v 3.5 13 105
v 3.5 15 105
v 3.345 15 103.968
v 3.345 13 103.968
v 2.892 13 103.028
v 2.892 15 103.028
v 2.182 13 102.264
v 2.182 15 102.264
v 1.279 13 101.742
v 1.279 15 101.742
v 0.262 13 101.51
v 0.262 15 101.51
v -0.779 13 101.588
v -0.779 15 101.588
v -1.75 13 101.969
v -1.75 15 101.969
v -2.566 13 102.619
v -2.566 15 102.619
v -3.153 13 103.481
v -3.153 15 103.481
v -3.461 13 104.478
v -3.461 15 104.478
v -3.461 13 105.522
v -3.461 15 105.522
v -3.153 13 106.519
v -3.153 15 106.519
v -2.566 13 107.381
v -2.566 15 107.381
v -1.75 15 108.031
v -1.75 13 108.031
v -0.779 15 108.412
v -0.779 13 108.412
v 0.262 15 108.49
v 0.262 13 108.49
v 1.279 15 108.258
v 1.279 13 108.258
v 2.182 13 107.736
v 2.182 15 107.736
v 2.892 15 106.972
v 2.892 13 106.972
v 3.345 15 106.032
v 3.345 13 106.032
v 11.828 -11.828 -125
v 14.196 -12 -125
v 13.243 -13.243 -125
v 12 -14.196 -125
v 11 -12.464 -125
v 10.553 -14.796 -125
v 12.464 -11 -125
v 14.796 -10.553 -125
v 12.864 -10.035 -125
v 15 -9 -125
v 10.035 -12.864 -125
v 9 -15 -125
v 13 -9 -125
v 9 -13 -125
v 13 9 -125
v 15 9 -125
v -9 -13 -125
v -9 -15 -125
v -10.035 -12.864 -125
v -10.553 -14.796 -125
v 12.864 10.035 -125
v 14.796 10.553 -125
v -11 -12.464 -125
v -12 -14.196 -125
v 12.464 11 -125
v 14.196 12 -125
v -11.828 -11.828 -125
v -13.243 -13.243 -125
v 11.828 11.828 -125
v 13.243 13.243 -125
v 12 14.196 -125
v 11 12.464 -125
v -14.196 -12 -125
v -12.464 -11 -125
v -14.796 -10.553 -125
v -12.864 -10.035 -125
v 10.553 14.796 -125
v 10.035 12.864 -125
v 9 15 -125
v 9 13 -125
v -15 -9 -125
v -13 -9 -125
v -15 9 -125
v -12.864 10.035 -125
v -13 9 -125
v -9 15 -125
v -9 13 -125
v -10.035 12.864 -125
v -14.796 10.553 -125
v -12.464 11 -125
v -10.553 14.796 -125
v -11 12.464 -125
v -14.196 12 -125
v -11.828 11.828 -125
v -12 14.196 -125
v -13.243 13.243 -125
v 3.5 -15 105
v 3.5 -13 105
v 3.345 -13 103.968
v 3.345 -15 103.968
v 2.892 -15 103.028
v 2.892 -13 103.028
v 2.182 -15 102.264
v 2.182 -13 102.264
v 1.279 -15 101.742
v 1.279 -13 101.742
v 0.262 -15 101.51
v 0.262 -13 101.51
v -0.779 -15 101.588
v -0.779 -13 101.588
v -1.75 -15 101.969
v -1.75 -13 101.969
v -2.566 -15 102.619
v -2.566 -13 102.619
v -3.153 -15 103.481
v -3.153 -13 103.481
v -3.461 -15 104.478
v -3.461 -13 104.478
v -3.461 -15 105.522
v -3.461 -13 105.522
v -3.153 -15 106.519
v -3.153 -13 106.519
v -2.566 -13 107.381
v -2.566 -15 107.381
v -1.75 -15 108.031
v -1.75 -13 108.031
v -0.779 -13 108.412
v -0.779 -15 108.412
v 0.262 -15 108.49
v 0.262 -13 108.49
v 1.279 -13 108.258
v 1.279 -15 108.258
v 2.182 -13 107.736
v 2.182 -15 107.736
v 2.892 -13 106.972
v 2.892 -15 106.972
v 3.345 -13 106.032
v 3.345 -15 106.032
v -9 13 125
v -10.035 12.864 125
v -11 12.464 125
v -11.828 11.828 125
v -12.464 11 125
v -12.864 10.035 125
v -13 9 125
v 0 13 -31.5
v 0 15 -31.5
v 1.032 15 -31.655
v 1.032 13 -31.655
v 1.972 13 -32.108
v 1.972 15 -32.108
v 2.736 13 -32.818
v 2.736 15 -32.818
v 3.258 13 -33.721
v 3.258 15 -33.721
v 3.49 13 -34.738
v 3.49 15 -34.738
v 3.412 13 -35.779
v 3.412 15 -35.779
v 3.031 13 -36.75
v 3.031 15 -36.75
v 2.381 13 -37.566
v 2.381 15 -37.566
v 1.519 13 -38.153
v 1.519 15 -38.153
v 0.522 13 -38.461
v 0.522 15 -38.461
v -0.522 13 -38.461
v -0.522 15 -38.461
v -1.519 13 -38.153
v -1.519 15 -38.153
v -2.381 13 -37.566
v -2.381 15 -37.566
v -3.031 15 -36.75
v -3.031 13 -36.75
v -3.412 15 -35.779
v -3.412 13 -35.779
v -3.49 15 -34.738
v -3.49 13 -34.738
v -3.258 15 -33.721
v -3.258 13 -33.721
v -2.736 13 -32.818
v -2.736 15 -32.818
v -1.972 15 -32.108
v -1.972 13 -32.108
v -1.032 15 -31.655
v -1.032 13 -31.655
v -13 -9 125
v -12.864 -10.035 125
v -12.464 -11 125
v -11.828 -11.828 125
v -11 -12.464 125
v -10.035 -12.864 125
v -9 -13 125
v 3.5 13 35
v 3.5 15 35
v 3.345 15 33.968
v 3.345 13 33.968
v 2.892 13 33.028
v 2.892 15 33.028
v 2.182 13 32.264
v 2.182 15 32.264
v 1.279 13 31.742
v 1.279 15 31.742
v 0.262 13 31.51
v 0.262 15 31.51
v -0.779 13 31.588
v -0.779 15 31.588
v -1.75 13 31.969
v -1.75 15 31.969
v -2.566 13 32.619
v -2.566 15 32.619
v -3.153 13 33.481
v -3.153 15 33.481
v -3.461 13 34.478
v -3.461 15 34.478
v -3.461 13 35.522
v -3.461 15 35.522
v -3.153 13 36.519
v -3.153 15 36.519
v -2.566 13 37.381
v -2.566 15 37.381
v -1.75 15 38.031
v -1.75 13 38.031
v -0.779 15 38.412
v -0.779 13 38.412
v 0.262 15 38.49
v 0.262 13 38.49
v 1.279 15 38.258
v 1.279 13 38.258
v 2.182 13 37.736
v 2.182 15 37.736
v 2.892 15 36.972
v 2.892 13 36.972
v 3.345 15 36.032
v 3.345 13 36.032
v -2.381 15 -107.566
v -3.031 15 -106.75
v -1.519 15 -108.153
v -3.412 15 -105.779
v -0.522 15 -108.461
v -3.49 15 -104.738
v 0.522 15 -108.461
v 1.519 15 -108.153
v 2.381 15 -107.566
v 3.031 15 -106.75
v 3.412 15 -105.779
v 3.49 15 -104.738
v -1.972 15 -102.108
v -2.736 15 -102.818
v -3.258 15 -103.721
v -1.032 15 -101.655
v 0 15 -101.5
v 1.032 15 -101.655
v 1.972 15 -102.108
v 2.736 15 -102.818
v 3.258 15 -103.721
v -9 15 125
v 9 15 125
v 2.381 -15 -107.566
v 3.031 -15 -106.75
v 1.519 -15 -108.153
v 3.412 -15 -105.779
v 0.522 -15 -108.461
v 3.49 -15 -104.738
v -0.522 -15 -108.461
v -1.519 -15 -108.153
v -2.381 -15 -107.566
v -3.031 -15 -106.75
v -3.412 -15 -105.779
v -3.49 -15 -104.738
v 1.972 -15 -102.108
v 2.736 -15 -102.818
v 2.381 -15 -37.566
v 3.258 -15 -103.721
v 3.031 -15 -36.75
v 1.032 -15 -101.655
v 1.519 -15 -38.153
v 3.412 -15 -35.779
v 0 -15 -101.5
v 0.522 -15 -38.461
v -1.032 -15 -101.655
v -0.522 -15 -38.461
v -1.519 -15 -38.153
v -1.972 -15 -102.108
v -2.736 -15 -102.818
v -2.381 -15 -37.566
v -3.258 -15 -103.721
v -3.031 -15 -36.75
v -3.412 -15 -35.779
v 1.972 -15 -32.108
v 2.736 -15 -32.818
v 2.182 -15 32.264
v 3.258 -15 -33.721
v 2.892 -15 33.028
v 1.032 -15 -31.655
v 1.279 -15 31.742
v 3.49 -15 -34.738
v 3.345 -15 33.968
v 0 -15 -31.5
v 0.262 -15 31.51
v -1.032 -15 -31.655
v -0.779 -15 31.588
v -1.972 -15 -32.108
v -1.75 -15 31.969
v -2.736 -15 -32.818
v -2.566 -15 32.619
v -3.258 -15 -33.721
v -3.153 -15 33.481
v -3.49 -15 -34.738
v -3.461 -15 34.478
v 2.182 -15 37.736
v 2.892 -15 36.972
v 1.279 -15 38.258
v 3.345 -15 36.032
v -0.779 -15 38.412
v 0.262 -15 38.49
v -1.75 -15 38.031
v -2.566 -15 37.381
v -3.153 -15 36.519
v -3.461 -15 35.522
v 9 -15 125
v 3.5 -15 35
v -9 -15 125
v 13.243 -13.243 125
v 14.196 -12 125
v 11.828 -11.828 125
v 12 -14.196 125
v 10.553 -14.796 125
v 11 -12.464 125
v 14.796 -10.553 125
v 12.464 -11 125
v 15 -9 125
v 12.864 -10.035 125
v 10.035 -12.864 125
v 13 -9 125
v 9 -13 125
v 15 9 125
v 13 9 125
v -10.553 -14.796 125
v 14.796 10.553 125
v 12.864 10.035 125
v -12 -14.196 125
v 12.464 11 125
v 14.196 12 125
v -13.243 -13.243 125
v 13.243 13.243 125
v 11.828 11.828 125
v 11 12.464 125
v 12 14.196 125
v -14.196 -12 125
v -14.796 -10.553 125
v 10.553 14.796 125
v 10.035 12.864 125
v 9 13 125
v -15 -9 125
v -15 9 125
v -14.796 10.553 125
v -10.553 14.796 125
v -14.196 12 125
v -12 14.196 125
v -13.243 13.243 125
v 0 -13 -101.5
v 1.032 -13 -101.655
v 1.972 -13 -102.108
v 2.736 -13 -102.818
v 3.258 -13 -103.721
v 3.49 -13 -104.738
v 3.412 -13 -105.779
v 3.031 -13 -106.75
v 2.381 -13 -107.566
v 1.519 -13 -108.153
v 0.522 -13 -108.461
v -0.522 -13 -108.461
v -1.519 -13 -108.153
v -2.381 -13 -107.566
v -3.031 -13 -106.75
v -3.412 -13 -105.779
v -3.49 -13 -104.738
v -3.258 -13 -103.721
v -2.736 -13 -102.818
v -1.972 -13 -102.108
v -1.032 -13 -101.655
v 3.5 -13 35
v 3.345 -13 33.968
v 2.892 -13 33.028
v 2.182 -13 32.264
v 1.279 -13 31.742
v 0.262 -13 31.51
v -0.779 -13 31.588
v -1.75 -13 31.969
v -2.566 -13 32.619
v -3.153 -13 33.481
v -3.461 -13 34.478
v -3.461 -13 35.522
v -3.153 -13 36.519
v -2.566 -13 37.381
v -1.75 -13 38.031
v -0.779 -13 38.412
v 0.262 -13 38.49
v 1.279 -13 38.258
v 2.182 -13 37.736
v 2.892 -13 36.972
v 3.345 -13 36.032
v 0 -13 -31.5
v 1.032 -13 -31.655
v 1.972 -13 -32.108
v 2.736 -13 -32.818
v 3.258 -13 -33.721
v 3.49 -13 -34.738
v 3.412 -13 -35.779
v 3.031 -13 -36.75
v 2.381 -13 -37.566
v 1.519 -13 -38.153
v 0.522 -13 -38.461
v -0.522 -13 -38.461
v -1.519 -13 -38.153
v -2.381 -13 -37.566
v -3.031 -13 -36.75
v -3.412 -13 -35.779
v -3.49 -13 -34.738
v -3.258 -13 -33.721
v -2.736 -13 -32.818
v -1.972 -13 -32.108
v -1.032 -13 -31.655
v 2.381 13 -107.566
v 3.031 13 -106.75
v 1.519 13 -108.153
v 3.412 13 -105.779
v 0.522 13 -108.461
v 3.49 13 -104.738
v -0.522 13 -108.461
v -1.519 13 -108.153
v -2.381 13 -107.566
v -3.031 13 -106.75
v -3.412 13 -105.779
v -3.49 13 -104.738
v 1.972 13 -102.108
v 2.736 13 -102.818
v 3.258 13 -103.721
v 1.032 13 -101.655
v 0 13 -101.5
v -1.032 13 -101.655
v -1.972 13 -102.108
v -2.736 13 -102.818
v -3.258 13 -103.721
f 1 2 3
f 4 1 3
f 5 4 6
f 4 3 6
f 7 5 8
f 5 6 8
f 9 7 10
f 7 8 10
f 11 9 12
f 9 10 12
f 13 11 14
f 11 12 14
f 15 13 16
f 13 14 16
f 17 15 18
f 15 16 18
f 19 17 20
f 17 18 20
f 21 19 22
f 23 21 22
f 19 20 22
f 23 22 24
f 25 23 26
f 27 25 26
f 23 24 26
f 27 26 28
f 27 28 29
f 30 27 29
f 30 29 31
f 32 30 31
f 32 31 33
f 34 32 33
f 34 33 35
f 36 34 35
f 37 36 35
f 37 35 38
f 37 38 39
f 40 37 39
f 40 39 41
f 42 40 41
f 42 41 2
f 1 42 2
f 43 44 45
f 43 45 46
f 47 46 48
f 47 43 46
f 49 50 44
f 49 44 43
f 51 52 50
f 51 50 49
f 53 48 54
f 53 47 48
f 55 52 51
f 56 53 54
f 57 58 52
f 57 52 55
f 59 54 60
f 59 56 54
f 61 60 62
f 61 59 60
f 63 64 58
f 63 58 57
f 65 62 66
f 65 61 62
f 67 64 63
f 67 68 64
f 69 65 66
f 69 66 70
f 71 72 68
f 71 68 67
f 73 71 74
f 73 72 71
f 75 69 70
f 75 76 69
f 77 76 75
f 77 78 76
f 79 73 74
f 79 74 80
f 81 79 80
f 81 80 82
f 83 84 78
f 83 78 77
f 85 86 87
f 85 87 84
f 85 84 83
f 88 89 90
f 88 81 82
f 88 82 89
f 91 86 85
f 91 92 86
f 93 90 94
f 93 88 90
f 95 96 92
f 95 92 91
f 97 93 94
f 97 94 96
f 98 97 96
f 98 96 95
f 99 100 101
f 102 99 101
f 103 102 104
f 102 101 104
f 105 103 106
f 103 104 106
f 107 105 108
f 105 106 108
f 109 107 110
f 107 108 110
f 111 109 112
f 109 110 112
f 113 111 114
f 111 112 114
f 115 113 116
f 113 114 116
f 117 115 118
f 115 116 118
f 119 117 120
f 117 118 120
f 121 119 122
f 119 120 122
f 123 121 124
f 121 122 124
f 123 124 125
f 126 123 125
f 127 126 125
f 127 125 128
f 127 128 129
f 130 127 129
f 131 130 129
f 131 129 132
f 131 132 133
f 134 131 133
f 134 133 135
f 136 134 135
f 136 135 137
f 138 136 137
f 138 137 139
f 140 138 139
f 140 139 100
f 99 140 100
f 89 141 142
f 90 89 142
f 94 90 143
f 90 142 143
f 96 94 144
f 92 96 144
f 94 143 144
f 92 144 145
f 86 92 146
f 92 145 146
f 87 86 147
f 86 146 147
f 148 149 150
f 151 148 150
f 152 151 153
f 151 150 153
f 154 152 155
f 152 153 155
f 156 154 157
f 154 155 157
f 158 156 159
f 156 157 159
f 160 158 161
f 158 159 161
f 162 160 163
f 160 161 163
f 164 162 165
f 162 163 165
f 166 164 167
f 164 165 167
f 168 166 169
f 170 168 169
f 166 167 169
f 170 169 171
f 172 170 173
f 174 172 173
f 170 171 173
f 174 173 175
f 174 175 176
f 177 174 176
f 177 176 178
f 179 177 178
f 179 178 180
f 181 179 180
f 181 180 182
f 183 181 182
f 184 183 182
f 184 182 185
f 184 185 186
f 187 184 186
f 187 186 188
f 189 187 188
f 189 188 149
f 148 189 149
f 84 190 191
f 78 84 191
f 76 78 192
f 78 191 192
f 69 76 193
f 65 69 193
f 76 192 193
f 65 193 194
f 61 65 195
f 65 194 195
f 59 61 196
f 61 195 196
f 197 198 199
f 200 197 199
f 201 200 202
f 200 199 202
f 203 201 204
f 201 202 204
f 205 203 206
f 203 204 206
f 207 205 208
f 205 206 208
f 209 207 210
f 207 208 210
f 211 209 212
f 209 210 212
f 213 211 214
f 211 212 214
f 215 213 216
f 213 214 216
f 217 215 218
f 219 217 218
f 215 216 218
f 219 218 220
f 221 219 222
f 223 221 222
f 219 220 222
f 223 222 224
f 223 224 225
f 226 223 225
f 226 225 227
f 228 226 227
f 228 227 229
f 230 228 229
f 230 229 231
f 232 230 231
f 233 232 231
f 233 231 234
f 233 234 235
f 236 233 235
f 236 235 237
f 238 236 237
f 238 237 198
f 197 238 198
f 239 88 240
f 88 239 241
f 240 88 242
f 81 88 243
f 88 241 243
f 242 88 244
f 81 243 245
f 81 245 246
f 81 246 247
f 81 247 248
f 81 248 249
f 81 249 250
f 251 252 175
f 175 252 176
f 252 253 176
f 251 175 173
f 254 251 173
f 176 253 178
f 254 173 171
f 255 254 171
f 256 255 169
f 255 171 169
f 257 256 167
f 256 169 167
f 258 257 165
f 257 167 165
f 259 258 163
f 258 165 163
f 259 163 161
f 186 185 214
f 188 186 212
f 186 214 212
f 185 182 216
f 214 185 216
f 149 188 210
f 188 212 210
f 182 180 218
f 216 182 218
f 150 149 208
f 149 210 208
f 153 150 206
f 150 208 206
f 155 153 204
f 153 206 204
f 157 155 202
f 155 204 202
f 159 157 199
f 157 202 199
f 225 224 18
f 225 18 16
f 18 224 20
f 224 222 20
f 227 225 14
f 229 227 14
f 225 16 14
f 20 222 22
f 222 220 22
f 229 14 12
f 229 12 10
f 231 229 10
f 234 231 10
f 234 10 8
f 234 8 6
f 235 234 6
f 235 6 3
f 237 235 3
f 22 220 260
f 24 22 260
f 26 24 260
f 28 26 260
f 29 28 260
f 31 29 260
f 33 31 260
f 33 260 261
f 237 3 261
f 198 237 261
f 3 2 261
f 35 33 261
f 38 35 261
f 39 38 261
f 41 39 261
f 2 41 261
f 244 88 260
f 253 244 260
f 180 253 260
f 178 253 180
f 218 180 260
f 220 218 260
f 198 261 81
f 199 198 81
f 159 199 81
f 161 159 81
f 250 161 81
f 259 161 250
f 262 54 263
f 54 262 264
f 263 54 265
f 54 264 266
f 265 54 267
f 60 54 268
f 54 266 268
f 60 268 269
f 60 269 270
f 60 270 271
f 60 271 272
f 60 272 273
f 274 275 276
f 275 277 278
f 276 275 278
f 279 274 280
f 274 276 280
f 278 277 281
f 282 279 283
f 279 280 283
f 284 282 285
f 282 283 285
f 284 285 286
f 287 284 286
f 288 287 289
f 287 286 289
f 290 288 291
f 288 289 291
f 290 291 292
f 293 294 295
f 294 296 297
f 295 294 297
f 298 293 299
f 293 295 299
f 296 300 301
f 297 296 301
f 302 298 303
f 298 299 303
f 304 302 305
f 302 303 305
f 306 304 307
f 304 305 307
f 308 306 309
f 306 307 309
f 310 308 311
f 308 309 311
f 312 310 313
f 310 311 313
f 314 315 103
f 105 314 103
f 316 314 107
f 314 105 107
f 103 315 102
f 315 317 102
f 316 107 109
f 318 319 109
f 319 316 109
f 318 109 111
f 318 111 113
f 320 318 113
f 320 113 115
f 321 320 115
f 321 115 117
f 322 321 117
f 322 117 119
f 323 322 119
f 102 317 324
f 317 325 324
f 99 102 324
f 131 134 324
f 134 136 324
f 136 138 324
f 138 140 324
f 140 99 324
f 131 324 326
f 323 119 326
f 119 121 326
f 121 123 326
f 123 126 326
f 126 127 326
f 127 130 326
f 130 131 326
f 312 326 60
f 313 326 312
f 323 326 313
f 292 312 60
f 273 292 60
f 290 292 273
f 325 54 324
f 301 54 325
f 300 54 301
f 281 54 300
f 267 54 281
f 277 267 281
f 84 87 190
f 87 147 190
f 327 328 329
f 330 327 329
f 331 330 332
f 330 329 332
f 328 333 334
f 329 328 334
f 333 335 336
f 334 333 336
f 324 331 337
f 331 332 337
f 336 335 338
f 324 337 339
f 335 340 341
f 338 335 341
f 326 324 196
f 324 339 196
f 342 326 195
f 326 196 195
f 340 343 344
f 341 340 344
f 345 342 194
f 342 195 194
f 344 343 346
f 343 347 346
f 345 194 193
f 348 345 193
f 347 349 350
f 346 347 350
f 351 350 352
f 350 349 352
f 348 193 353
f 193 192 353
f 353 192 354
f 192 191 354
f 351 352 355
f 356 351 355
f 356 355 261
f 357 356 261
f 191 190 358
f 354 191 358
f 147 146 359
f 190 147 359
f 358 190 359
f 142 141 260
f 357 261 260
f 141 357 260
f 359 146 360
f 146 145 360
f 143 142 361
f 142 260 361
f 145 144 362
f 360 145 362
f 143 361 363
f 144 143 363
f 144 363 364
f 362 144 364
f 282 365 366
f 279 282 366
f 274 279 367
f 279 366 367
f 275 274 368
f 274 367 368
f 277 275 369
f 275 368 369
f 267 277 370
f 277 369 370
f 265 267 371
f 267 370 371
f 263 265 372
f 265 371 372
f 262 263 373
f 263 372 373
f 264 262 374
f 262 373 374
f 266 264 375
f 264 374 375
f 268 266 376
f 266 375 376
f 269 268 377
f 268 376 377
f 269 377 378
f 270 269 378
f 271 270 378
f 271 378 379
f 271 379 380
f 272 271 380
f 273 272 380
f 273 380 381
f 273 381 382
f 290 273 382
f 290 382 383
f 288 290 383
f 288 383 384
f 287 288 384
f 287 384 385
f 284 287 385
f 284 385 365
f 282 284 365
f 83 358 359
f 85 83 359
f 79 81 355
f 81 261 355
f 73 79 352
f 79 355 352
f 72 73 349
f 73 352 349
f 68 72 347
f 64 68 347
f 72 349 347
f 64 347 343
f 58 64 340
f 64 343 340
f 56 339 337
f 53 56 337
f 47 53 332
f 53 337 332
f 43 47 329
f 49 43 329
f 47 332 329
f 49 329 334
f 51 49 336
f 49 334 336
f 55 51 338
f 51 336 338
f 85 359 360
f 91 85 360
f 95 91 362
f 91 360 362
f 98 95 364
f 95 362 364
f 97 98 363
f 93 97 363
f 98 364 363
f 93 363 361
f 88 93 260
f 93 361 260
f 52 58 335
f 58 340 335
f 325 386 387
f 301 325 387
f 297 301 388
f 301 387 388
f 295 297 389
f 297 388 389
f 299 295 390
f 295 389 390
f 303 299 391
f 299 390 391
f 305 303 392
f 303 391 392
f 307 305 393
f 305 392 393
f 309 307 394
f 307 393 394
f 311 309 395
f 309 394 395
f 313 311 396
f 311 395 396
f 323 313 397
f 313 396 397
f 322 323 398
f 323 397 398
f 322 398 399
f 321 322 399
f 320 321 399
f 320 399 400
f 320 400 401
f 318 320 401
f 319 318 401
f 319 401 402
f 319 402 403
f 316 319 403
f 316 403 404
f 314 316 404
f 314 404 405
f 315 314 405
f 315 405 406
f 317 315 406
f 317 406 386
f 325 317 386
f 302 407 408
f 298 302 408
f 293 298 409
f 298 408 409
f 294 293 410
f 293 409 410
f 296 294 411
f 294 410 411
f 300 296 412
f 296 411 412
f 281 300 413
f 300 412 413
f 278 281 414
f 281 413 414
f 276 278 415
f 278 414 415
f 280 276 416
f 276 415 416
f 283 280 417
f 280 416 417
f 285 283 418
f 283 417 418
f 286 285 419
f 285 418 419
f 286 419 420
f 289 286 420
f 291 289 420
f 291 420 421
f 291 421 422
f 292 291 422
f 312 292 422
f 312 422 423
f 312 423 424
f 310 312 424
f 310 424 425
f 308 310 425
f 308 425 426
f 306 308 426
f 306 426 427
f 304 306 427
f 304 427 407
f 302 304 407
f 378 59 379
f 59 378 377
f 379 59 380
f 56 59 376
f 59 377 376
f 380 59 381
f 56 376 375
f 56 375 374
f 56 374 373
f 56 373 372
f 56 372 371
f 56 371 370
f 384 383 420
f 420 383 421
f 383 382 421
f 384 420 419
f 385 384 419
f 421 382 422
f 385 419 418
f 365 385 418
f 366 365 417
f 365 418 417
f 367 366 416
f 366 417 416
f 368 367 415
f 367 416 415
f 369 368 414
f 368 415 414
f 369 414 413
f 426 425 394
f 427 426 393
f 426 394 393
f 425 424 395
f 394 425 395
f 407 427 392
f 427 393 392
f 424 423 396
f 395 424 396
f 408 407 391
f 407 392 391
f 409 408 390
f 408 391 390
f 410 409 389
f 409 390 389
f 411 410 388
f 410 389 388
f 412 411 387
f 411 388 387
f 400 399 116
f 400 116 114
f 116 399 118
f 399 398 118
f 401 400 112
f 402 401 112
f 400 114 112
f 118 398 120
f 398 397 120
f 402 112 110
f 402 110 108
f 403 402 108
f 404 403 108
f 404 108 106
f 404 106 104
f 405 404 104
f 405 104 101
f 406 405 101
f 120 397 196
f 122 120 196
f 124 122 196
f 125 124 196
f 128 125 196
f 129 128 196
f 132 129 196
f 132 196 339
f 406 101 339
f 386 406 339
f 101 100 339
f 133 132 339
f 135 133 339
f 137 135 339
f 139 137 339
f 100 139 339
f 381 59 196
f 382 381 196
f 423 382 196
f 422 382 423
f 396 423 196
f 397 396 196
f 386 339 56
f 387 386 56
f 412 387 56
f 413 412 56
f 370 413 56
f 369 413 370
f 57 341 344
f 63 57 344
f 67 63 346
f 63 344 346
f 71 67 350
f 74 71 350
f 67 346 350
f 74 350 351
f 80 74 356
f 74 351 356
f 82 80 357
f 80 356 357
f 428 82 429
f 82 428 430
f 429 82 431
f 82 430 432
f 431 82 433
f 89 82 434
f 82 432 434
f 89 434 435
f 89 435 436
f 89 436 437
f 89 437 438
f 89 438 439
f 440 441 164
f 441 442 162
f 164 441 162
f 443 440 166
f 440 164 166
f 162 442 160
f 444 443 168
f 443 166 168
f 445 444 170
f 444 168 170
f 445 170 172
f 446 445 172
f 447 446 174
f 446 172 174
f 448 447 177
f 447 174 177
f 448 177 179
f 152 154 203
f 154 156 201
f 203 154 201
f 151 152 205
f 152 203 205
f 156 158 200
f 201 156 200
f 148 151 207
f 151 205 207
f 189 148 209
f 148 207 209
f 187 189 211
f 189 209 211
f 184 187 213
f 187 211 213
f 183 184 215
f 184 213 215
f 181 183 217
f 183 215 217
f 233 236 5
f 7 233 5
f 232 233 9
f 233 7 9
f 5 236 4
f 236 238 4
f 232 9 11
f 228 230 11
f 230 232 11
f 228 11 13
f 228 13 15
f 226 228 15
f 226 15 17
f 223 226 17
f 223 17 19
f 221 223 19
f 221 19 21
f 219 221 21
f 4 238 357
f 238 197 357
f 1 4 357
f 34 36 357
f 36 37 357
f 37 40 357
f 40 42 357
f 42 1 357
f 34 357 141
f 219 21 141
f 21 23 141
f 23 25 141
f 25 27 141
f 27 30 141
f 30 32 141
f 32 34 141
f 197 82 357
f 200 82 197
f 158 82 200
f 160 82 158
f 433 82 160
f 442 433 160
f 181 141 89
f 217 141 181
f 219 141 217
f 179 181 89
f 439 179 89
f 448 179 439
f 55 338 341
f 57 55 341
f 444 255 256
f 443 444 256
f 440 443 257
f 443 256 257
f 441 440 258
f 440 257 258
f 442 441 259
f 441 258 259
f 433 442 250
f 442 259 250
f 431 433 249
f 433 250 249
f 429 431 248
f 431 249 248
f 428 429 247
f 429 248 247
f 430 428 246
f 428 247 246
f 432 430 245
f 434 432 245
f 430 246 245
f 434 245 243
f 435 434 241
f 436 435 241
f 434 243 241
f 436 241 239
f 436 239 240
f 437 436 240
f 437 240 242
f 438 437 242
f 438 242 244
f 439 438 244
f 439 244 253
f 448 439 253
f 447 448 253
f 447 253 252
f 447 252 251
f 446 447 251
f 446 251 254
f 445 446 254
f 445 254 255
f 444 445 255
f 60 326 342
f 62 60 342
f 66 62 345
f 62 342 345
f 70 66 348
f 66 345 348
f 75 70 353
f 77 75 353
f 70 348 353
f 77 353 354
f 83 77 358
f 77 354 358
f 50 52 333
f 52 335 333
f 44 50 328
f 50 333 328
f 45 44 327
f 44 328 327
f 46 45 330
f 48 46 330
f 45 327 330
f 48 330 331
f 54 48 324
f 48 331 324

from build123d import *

# Parameters (mm, degrees)
AUFSATZ_LINEAR_AUSTRAGEN1_DEPTH = 125
SKIZZE2_R                       = 3.5
SCHNITT_LINEAR_AUSTRAGEN1_DEPTH = 60


with BuildPart() as part:
    # Skizze1 → Aufsatz-Linear austragen1 (new, symmetric)
    with BuildSketch(Plane.XY):
        with BuildLine():
            Line((-9, 15), (9, 15))
            ThreePointArc((9, 15), (13.242640687, 13.242640687), (15, 9))
            Line((15, 9), (15, -9))
            ThreePointArc((15, -9), (13.242640687, -13.242640687), (9, -15))
            Line((9, -15), (-9, -15))
            ThreePointArc((-9, -15), (-13.242640687, -13.242640687), (-15, -9))
            Line((-15, -9), (-15, 9))
            ThreePointArc((-15, 9), (-13.242640687, 13.242640687), (-9, 15))
        make_face()
        with BuildLine():
            Line((-13, 9), (-13, -9))
            ThreePointArc((-13, -9), (-11.828427125, -11.828427125), (-9, -13))
            Line((-9, -13), (9, -13))
            ThreePointArc((9, -13), (11.828427125, -11.828427125), (13, -9))
            Line((13, -9), (13, 9))
            ThreePointArc((13, 9), (11.828427125, 11.828427125), (9, 13))
            Line((9, 13), (-9, 13))
            ThreePointArc((-9, 13), (-11.828427125, 11.828427125), (-13, 9))
        make_face(mode=Mode.SUBTRACT)
    extrude(amount=AUFSATZ_LINEAR_AUSTRAGEN1_DEPTH, both=True)

    # Skizze2 → Schnitt-Linear austragen1 (cut)
    with BuildSketch(Plane(origin=(0, 15, 0), x_dir=(1, 0, 0), z_dir=(0, 1, 0))):
        with Locations(Location((0, 105, 0), (0, 0, 270))):
            Circle(SKIZZE2_R)
        with Locations(Location((0, 35, 0), (0, 0, 270))):
            Circle(SKIZZE2_R)
        with Locations((0, -35)):
            Circle(SKIZZE2_R)
        with Locations((0, -105)):
            Circle(SKIZZE2_R)
    extrude(amount=-SCHNITT_LINEAR_AUSTRAGEN1_DEPTH, mode=Mode.SUBTRACT)


solid = part.part
